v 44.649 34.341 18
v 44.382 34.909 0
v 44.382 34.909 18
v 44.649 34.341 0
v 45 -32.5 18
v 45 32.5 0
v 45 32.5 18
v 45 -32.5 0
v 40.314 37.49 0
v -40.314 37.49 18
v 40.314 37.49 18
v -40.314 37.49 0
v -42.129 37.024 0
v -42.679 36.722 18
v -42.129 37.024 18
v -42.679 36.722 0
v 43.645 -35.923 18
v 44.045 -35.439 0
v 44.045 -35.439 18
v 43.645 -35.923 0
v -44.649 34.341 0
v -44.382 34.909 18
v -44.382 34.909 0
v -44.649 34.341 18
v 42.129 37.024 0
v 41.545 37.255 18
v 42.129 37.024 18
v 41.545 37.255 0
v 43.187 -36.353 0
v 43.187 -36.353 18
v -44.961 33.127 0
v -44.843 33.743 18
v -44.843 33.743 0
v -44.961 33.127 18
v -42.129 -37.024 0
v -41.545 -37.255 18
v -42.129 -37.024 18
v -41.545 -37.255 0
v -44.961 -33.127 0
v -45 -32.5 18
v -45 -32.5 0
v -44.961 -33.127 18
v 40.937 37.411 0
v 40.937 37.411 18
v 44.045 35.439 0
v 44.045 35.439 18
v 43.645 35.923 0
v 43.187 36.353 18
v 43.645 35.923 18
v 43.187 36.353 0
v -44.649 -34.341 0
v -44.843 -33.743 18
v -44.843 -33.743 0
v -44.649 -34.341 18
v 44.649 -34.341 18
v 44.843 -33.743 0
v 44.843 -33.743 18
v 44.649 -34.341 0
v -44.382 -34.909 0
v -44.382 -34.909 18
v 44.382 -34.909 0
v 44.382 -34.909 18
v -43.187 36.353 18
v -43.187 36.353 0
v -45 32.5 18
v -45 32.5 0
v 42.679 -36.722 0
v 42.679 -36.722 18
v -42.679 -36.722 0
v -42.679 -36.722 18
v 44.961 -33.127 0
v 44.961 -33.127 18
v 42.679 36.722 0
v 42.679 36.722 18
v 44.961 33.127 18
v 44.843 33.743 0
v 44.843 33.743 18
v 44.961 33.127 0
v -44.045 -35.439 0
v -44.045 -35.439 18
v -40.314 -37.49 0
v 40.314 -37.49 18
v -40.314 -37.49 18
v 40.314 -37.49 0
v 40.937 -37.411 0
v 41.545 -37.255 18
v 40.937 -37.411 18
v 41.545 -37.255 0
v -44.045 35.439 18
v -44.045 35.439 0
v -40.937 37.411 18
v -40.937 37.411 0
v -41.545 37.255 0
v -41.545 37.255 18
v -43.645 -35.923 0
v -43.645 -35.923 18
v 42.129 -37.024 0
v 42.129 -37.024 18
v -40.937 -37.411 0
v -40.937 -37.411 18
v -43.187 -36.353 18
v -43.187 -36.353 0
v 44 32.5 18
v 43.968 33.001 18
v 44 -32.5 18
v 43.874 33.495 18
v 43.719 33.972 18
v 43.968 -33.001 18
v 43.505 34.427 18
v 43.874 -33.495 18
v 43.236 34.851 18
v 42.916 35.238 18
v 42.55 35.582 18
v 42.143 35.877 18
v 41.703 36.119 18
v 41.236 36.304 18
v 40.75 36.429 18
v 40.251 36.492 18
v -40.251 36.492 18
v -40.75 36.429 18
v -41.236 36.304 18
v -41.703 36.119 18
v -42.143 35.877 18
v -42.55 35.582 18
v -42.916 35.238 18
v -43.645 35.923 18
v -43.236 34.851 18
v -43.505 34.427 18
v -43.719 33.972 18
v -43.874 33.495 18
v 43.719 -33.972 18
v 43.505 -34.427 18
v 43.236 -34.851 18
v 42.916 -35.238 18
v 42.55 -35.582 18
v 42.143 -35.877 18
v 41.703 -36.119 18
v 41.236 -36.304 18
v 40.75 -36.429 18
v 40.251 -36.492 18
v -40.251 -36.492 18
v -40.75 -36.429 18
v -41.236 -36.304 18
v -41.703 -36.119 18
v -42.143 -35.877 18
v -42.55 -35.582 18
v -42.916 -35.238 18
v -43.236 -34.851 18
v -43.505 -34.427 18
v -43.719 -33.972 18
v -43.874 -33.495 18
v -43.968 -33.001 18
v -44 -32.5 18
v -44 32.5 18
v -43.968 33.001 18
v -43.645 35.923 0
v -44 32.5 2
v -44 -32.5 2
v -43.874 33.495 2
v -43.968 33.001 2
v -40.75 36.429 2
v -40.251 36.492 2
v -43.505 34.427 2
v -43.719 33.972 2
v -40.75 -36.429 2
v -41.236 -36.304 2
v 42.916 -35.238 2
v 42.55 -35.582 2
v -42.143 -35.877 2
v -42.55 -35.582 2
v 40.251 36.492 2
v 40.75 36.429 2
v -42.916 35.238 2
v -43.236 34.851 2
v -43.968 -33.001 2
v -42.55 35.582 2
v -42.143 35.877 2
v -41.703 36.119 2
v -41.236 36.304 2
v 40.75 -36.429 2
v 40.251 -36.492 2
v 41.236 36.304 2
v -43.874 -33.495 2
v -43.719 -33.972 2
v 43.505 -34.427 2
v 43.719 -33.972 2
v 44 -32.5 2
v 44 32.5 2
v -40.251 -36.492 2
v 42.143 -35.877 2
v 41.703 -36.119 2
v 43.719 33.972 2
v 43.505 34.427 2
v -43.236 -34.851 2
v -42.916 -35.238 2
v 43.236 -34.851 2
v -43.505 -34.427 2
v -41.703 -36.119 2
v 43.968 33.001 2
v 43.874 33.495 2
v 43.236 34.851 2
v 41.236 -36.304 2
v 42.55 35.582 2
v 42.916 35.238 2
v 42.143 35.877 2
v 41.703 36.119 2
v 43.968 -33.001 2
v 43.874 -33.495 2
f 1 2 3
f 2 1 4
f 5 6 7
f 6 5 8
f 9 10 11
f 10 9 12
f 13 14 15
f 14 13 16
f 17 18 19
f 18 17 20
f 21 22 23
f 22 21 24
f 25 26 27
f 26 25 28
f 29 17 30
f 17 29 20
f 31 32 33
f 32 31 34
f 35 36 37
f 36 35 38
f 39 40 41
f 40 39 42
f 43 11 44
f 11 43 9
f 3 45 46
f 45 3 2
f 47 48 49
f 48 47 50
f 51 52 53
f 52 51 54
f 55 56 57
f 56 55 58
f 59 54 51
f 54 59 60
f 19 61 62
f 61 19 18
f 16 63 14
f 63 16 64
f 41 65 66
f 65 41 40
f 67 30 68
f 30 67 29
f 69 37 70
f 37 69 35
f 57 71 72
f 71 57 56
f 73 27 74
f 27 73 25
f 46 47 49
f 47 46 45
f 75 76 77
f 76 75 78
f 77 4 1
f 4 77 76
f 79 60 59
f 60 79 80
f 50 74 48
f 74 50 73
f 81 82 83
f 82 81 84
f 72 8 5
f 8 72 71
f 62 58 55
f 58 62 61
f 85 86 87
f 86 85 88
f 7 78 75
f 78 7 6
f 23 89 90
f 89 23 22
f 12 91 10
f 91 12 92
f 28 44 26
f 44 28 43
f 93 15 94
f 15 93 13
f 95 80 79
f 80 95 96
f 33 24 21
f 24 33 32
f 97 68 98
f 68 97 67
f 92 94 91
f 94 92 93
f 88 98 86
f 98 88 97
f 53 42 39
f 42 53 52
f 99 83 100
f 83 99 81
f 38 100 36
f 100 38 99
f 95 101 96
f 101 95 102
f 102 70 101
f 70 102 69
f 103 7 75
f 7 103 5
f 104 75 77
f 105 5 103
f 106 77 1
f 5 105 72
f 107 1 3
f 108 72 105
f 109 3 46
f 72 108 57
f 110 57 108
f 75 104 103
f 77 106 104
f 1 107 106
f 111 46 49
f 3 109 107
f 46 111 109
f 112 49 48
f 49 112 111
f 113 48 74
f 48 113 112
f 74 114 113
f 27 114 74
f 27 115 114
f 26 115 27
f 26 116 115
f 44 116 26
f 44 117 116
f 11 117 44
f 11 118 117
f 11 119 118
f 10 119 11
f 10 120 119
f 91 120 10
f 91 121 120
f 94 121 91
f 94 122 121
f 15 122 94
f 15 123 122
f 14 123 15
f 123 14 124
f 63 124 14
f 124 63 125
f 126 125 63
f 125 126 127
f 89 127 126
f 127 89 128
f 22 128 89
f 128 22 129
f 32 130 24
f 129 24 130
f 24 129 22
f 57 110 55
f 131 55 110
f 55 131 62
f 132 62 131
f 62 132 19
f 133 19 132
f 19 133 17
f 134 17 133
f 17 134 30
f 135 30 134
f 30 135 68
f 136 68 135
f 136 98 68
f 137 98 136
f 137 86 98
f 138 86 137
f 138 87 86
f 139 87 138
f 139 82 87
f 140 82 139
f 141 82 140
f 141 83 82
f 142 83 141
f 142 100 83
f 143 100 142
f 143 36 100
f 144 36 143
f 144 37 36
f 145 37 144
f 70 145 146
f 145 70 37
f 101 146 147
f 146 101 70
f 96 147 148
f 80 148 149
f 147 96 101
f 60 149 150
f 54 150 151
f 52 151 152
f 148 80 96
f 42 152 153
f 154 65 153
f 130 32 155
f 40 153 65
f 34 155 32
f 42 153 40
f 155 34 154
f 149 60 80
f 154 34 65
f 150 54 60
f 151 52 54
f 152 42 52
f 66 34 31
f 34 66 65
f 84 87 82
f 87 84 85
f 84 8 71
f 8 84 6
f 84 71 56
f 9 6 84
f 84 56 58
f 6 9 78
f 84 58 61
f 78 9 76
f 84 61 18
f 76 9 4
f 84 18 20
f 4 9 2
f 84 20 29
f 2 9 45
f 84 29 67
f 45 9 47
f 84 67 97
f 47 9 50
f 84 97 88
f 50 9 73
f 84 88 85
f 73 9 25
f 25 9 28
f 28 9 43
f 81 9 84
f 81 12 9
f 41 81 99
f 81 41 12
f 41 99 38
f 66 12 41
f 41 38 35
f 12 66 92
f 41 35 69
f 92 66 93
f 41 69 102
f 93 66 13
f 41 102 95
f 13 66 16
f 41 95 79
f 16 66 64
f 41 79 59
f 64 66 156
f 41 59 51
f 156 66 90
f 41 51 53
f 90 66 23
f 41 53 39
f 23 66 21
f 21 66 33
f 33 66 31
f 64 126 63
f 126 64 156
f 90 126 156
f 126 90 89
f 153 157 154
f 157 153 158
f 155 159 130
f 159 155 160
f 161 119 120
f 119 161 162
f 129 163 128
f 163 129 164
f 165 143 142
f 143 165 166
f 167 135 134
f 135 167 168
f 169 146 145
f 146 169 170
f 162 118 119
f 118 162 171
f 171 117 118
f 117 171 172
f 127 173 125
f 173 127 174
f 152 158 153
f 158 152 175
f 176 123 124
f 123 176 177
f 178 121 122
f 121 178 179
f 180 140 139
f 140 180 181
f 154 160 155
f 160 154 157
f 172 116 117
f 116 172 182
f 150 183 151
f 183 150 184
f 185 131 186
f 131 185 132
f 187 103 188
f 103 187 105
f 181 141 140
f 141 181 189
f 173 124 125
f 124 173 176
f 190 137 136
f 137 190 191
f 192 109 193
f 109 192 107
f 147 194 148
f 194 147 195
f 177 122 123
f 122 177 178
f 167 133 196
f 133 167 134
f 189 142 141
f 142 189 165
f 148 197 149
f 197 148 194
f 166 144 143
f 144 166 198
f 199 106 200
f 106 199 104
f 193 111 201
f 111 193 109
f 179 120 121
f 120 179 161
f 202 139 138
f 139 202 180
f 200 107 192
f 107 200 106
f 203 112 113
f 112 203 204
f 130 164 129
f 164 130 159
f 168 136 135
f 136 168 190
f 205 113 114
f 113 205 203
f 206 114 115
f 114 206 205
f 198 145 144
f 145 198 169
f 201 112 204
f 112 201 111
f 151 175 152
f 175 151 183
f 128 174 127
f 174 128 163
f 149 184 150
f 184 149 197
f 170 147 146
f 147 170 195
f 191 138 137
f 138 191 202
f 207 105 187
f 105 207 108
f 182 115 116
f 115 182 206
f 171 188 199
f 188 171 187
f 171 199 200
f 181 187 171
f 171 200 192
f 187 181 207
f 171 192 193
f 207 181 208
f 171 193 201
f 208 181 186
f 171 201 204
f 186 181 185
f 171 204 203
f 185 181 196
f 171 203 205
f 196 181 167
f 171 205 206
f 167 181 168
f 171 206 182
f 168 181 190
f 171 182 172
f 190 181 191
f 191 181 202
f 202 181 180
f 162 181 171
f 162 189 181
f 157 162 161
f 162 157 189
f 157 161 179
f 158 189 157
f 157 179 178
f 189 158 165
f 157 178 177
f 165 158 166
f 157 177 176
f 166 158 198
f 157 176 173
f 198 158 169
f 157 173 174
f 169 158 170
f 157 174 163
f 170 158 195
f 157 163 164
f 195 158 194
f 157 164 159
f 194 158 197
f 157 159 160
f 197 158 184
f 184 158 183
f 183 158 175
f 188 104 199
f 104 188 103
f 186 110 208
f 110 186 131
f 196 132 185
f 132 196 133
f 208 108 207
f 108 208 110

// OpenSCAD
$fn = 50;


difference() {
	union() {
		hull() {
			translate(v = [-40.0000000000, 32.5000000000, 0]) {
				cylinder(h = 18, r = 5);
			}
			translate(v = [40.0000000000, 32.5000000000, 0]) {
				cylinder(h = 18, r = 5);
			}
			translate(v = [-40.0000000000, -32.5000000000, 0]) {
				cylinder(h = 18, r = 5);
			}
			translate(v = [40.0000000000, -32.5000000000, 0]) {
				cylinder(h = 18, r = 5);
			}
		}
	}
	union() {
		translate(v = [0, 0, 2]) {
			hull() {
				translate(v = [-40.0000000000, 32.5000000000, 0]) {
					cylinder(h = 16, r = 4);
				}
				translate(v = [40.0000000000, 32.5000000000, 0]) {
					cylinder(h = 16, r = 4);
				}
				translate(v = [-40.0000000000, -32.5000000000, 0]) {
					cylinder(h = 16, r = 4);
				}
				translate(v = [40.0000000000, -32.5000000000, 0]) {
					cylinder(h = 16, r = 4);
				}
			}
		}
	}
}
